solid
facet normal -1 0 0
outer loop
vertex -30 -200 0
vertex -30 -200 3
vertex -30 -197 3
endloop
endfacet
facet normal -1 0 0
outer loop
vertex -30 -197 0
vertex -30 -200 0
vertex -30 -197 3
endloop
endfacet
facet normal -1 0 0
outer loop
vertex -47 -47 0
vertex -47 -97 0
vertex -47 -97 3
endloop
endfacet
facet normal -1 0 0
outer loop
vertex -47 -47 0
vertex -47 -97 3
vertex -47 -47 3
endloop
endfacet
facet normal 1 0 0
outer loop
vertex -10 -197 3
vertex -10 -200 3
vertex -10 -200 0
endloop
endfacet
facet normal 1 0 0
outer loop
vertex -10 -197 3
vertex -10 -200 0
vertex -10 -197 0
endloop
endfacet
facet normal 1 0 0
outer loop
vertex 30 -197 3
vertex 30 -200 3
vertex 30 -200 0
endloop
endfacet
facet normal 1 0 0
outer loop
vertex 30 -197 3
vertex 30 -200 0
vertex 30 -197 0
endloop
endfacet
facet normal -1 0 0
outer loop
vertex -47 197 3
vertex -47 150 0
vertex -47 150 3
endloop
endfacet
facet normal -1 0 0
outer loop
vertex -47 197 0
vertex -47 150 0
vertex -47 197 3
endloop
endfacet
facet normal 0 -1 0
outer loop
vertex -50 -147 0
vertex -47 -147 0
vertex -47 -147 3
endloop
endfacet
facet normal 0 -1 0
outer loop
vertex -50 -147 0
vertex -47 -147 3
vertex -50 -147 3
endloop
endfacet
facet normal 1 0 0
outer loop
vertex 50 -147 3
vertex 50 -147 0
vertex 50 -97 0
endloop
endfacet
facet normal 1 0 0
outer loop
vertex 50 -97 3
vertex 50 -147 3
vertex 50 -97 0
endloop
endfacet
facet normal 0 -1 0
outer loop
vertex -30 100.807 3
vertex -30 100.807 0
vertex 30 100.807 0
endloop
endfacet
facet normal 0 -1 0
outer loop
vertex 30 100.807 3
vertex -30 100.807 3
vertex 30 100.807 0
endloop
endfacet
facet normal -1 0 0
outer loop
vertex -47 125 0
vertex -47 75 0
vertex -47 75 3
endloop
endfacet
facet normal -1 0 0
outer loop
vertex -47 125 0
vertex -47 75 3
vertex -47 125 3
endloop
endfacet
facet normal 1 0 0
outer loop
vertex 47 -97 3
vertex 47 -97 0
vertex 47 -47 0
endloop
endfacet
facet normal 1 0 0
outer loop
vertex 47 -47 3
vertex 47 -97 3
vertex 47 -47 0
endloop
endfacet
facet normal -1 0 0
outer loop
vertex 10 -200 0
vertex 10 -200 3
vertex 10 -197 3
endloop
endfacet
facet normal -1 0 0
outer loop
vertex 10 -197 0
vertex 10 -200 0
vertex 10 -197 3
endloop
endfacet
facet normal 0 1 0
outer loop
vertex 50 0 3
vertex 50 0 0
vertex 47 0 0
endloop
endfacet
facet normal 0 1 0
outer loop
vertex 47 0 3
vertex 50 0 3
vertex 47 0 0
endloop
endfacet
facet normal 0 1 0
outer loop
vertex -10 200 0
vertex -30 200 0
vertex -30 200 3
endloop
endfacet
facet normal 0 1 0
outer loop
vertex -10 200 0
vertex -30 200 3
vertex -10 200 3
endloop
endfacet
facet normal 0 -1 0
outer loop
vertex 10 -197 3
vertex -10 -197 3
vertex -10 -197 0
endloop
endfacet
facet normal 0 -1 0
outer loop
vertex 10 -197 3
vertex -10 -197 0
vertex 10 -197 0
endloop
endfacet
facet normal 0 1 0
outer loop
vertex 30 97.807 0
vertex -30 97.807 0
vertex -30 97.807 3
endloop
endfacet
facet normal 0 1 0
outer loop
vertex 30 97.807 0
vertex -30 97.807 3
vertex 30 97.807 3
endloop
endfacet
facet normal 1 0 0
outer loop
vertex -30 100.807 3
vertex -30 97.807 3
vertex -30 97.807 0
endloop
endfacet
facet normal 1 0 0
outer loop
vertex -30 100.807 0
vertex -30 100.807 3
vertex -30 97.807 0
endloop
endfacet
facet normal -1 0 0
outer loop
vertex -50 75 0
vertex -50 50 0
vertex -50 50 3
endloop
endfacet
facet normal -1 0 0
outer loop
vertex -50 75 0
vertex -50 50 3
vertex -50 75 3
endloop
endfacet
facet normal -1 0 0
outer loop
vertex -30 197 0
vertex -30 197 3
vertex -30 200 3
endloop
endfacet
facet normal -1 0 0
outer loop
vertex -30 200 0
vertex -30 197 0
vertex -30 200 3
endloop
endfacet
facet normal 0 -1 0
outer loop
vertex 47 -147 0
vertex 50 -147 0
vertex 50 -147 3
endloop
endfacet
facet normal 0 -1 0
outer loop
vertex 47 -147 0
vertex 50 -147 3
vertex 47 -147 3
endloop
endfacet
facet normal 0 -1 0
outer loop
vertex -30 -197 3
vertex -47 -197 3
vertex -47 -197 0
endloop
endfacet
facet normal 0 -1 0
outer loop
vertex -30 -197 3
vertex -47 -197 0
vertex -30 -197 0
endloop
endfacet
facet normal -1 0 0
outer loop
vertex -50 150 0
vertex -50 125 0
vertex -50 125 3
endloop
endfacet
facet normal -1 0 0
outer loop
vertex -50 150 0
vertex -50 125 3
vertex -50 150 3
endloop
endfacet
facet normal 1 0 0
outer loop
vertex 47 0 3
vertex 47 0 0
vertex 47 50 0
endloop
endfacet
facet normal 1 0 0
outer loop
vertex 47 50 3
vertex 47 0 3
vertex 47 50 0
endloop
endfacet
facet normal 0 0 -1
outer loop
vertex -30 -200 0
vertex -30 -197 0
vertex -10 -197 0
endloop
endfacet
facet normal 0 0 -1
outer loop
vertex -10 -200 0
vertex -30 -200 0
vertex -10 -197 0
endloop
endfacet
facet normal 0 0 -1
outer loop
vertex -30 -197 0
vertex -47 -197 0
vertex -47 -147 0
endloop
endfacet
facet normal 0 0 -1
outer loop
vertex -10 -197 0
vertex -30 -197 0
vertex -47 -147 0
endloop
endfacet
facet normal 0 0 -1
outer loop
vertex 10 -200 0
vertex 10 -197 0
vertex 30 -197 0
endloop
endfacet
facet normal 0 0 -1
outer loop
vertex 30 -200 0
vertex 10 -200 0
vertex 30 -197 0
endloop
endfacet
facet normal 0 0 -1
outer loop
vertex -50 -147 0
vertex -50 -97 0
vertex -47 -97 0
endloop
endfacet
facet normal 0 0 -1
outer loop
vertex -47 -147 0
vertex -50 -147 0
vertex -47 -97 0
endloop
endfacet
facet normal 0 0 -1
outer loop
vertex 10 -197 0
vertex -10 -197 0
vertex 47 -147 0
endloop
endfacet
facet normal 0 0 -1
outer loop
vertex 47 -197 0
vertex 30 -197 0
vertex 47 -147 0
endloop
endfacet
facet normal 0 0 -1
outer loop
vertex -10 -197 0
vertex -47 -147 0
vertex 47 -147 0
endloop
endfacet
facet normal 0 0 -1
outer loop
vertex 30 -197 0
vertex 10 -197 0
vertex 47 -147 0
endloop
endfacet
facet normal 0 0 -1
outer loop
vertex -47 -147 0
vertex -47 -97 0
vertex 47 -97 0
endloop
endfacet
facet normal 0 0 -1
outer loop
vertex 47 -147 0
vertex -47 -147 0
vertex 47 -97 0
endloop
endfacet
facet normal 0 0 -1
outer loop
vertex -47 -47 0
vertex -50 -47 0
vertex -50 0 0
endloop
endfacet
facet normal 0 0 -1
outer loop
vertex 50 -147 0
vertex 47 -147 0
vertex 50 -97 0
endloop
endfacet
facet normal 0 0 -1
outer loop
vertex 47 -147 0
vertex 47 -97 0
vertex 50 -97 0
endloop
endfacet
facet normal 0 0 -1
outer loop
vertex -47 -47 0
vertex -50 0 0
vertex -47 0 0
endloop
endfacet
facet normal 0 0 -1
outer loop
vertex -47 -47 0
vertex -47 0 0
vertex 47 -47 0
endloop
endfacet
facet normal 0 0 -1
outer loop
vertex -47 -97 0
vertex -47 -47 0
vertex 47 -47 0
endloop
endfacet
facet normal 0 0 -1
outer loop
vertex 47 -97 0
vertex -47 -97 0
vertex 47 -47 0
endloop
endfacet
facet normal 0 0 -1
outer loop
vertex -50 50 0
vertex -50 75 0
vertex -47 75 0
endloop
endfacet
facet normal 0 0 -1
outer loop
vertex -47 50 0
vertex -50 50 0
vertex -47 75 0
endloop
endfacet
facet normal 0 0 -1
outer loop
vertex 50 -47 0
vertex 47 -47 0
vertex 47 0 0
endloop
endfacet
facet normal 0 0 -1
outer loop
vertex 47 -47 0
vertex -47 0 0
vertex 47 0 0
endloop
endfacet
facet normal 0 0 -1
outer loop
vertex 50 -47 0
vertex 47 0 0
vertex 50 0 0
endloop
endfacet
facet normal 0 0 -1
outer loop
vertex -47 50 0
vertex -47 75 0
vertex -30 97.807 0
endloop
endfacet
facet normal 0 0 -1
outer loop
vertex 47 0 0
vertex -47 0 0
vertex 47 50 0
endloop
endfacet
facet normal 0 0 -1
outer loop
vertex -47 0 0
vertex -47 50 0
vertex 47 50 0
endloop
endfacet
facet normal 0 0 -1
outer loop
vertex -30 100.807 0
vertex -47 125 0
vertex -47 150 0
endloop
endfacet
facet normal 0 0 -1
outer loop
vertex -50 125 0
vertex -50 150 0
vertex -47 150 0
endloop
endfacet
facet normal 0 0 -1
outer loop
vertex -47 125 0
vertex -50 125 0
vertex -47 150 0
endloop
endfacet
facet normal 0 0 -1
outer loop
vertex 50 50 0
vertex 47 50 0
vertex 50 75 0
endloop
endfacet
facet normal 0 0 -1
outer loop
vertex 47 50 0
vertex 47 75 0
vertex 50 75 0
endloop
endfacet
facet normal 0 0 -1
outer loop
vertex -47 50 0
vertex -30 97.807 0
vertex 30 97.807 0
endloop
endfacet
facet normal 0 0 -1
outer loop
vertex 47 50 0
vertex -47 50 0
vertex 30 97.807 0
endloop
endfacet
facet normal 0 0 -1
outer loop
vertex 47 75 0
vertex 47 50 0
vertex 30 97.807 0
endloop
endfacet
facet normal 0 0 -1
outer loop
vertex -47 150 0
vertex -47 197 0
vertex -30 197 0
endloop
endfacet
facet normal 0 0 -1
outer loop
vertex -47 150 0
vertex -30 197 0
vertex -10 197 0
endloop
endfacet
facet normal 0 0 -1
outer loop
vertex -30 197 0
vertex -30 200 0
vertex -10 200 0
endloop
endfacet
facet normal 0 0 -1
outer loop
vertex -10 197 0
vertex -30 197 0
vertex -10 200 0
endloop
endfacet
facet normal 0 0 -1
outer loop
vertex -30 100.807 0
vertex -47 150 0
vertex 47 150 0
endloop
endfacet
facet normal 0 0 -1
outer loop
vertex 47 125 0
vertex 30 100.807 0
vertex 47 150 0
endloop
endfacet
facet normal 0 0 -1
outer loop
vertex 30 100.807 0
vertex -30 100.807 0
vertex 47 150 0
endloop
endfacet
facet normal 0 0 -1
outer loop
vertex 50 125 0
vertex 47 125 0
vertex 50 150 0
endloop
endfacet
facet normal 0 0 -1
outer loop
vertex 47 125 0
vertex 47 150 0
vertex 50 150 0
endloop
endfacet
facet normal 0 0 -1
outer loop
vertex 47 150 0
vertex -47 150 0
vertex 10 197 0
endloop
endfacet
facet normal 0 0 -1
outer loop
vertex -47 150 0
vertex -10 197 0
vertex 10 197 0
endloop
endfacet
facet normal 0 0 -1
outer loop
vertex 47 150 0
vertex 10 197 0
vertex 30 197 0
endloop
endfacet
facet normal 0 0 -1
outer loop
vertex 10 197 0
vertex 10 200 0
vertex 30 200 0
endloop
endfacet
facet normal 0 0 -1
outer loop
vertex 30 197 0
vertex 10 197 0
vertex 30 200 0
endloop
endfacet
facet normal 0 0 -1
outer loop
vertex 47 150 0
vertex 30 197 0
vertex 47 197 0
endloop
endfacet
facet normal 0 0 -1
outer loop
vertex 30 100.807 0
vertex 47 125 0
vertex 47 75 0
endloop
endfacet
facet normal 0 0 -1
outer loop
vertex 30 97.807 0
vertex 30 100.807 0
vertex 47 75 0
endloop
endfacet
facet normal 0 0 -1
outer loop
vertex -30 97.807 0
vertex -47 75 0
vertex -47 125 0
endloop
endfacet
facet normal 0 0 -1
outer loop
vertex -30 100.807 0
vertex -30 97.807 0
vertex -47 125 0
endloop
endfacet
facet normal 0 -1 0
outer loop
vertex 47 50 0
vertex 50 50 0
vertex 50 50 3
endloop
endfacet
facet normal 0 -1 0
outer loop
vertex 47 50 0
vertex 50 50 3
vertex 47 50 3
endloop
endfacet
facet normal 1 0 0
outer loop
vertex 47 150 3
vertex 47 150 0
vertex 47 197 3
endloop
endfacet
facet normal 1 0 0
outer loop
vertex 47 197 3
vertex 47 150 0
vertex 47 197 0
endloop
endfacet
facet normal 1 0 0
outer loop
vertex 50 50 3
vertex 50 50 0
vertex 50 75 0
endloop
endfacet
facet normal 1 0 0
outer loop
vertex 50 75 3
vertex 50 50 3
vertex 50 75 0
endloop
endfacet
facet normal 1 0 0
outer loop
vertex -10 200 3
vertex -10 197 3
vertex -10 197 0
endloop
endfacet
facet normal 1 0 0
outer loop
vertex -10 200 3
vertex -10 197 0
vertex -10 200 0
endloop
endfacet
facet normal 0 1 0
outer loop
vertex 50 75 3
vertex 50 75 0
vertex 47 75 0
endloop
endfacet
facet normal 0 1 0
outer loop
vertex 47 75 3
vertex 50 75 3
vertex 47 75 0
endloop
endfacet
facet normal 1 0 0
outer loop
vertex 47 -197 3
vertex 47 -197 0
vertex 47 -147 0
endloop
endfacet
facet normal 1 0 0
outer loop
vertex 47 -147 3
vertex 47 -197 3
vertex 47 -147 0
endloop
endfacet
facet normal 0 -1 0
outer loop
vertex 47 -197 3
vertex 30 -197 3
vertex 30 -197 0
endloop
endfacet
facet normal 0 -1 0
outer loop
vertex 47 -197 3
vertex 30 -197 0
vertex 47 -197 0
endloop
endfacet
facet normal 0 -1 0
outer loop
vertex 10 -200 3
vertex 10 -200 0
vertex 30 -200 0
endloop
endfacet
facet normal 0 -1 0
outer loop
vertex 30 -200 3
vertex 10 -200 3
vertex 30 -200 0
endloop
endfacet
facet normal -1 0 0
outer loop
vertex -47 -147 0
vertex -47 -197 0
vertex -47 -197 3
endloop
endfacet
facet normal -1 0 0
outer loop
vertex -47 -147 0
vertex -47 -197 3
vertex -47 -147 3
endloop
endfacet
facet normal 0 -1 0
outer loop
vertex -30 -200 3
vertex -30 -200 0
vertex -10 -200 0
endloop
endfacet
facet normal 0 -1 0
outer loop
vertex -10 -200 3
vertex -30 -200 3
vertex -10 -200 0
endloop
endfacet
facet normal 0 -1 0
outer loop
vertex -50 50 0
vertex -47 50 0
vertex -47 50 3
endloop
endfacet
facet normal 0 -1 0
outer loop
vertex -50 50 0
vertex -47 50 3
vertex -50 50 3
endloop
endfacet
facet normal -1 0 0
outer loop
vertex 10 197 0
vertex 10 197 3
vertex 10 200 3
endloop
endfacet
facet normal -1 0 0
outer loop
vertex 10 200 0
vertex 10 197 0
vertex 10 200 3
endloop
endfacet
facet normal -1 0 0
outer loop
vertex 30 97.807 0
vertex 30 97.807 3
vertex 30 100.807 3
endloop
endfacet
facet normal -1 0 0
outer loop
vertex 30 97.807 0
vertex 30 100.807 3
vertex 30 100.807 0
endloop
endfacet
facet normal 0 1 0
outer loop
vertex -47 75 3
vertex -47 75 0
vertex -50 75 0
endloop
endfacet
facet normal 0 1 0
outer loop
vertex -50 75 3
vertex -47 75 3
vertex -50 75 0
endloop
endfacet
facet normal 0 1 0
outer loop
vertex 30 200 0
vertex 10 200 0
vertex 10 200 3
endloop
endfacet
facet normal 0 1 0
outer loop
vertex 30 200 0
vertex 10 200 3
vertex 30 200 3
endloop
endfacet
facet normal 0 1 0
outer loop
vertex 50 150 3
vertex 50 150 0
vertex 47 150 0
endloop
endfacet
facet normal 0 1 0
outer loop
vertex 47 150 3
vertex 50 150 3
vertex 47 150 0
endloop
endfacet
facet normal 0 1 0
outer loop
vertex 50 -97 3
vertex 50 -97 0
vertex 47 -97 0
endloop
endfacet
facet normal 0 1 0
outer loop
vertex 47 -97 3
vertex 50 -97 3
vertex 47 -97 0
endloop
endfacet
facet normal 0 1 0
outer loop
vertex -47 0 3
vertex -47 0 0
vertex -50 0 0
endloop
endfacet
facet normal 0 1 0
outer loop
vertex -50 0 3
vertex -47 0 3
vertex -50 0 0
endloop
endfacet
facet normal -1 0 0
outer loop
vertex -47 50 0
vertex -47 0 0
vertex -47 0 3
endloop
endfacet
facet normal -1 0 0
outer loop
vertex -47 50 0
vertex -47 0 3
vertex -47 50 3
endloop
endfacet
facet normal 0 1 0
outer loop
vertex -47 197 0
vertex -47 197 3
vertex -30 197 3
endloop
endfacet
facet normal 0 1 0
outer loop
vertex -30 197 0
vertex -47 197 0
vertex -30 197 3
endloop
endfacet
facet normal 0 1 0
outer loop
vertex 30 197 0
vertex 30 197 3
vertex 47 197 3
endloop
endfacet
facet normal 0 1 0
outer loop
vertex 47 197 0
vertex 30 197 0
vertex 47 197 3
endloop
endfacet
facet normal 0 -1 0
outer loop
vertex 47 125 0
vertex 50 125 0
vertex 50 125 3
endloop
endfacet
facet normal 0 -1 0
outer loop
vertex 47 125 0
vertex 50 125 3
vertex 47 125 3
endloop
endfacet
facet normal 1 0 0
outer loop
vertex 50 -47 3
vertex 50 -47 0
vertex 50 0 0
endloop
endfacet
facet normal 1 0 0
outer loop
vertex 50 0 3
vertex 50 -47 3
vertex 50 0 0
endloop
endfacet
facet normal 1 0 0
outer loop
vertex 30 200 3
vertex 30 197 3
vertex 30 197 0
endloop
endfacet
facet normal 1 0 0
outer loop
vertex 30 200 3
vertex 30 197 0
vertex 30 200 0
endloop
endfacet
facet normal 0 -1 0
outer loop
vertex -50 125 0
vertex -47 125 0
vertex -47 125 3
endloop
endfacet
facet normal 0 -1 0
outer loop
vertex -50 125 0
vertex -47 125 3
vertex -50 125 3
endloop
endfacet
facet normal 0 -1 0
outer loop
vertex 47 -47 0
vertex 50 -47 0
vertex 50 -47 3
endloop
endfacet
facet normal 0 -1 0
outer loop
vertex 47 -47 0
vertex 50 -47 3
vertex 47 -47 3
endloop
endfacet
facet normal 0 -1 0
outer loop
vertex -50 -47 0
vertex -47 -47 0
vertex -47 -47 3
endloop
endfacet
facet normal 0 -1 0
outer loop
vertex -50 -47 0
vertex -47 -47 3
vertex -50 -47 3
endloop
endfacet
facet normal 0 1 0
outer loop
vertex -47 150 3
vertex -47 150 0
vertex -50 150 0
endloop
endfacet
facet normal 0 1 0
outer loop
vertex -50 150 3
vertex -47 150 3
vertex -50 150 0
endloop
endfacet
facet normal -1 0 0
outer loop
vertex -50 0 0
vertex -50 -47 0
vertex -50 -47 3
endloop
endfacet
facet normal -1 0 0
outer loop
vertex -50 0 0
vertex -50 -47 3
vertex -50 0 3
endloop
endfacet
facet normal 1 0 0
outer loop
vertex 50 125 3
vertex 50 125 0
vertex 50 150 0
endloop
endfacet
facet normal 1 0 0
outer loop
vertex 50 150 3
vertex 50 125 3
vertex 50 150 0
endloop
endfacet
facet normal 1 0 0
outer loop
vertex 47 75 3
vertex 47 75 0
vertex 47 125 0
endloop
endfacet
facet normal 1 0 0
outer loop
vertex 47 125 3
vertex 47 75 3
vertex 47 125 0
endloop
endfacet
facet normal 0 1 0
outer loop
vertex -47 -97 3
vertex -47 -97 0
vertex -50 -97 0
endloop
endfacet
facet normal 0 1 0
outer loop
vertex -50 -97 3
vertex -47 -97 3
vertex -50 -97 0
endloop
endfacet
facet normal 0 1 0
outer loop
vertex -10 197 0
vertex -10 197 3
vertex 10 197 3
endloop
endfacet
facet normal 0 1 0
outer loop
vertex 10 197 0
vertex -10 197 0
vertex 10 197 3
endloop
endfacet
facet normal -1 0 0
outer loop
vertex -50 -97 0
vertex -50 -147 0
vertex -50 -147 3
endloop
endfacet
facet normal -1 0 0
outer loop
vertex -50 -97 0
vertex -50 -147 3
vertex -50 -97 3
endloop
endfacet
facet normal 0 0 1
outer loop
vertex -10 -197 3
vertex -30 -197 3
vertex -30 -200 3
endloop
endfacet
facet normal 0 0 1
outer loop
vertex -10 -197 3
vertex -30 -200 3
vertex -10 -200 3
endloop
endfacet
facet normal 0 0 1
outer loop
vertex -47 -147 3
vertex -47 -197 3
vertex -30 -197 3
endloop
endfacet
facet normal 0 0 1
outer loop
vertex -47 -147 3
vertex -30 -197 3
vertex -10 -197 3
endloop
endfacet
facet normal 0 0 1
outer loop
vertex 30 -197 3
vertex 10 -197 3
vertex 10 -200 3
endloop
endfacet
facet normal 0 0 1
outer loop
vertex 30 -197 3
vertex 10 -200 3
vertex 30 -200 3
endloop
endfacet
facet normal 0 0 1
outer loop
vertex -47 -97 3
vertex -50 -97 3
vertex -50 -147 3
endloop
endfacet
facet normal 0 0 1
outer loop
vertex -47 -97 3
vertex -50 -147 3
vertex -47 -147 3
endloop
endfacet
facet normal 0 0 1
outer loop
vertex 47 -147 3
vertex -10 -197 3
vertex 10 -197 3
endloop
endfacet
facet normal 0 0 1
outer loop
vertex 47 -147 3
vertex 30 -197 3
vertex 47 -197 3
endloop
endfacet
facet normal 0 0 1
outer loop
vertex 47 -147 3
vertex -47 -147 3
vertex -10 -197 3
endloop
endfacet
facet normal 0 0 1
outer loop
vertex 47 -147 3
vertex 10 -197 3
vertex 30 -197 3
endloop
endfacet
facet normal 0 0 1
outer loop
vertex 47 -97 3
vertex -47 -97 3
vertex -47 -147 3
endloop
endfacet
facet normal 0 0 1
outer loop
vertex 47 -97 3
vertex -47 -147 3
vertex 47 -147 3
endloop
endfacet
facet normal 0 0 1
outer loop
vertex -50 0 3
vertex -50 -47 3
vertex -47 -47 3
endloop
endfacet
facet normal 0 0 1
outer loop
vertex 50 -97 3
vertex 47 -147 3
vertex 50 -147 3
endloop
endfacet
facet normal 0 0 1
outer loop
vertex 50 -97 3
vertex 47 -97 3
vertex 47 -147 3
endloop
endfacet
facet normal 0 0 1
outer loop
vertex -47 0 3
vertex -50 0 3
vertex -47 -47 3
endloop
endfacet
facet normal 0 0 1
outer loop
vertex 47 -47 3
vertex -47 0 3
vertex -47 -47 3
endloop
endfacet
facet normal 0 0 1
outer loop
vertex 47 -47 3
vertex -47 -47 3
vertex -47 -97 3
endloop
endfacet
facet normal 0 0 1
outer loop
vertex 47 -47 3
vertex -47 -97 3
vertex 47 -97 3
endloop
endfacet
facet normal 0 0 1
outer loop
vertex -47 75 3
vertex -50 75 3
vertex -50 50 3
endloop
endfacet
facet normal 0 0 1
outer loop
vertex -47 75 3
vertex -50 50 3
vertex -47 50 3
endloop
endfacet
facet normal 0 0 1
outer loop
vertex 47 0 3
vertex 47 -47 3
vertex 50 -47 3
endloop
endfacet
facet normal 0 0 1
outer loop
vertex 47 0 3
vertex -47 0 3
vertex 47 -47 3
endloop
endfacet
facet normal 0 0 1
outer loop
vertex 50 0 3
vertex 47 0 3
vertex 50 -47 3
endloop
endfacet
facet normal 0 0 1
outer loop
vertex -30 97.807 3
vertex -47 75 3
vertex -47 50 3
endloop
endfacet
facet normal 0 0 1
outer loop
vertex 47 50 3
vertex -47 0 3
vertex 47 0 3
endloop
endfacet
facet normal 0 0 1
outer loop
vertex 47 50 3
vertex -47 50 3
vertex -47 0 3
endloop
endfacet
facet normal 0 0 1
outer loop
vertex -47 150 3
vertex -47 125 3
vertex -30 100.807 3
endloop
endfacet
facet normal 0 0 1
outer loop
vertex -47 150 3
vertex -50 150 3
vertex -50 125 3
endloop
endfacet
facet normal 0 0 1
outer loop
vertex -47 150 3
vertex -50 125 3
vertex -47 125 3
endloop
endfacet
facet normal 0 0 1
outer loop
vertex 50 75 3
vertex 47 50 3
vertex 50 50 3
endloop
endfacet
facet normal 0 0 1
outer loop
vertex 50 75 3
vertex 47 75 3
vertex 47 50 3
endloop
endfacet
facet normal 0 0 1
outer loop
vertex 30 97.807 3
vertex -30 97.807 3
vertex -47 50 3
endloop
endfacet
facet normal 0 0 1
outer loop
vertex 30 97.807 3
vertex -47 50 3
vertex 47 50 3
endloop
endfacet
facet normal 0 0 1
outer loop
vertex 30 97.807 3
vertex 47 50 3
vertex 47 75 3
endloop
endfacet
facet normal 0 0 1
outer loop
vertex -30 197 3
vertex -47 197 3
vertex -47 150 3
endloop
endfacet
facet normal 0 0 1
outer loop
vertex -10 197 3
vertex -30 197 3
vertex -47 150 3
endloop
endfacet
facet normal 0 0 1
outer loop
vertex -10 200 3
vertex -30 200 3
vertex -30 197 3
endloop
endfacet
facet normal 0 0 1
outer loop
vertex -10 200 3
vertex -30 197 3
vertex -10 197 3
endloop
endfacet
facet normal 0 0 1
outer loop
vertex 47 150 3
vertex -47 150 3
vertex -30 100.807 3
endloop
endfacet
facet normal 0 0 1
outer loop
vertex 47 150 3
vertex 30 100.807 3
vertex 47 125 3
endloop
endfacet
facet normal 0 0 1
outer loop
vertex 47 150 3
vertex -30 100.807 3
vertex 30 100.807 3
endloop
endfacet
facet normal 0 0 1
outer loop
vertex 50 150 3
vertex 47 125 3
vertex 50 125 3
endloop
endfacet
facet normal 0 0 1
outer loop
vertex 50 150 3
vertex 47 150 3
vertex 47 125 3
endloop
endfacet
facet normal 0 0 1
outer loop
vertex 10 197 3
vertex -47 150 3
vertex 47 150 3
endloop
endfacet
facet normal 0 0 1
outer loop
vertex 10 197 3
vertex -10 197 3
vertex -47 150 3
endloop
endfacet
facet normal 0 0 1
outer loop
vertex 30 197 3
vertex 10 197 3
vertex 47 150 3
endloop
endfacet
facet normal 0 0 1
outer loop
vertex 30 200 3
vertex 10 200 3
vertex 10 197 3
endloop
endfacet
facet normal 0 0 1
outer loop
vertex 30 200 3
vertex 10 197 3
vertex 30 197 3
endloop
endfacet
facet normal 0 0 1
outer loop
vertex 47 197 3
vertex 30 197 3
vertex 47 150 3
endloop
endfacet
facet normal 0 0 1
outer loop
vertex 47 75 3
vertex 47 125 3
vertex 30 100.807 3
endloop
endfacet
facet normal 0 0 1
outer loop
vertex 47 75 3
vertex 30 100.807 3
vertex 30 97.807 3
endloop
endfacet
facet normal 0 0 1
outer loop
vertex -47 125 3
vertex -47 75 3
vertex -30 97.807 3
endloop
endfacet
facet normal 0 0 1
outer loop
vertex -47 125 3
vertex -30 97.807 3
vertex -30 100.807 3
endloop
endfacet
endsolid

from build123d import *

# Parameters (mm, degrees)
SKETCH1_W           = 100
SKETCH1_H           = 400
BOSS_EXTRUDE1_DEPTH = 3
SKETCH2_W           = 20
SKETCH2_H           = 3
CUT_EXTRUDE1_DEPTH  = 3
SKETCH4_W           = 3
SKETCH4_H           = 47
SKETCH4_H_2         = 50
CUT_EXTRUDE2_DEPTH  = 3
CAVITY1_START       = 97.807385879
CAVITY1_OUTLINE_W   = 60
CAVITY1_OUTLINE_H   = 3
CAVITY1_DEPTH       = 3


# Read off the part's stored shape, not the designer's step: Cavity1
with BuildPart() as part:
    # Sketch1 → Boss-Extrude1 (new body)
    with BuildSketch(Plane.XY):
        Rectangle(SKETCH1_W, SKETCH1_H)
    extrude(amount=BOSS_EXTRUDE1_DEPTH)

    # Sketch2 → Cut-Extrude1 (cut)
    with BuildSketch(Plane.XY.offset(3)):
        with Locations((-40, -198.5)):
            Rectangle(SKETCH2_W, SKETCH2_H)
        with Locations((0, -198.5)):
            Rectangle(SKETCH2_W, SKETCH2_H)
        with Locations((40, -198.5)):
            Rectangle(SKETCH2_W, SKETCH2_H)
        with Locations((40, 198.5)):
            Rectangle(SKETCH2_W, SKETCH2_H)
        with Locations((0, 198.5)):
            Rectangle(SKETCH2_W, SKETCH2_H)
        with Locations((-40, 198.5)):
            Rectangle(SKETCH2_W, SKETCH2_H)
    extrude(amount=-CUT_EXTRUDE1_DEPTH, mode=Mode.SUBTRACT)

    # Sketch4 → Cut-Extrude2 (cut)
    with BuildSketch(Plane(origin=(0, 0, 0), x_dir=(-1, 0, 0), z_dir=(0, 0, -1))):
        with Locations((-48.5, 173.5)):
            Rectangle(SKETCH4_W, SKETCH4_H)
        with Locations((-48.5, 25)):
            Rectangle(SKETCH4_W, SKETCH4_H_2)
        with Locations((-48.5, -72)):
            Rectangle(SKETCH4_W, SKETCH4_H_2)
        with Locations((-48.5, -172)):
            Rectangle(SKETCH4_W, SKETCH4_H_2)
        with Locations((48.5, -172)):
            Rectangle(SKETCH4_W, SKETCH4_H_2)
        with Locations((48.5, -72)):
            Rectangle(SKETCH4_W, SKETCH4_H_2)
        with Locations((48.5, 25)):
            Rectangle(SKETCH4_W, SKETCH4_H_2)
        with Locations((48.5, 173.5)):
            Rectangle(SKETCH4_W, SKETCH4_H)
        with Locations((48.5, 100)):
            Rectangle(SKETCH4_W, SKETCH4_H_2)
        with Locations((-48.5, 100)):
            Rectangle(SKETCH4_W, SKETCH4_H_2)
    extrude(amount=-CUT_EXTRUDE2_DEPTH, mode=Mode.SUBTRACT)

    # Cavity1 outline → Cavity1 (cut)
    with BuildSketch(Plane(origin=(0, 0, 0), x_dir=(1, 0, 0), z_dir=(0, 1, 0)).offset(CAVITY1_START)):
        with Locations((0, -1.5)):
            Rectangle(CAVITY1_OUTLINE_W, CAVITY1_OUTLINE_H)
    extrude(amount=CAVITY1_DEPTH, mode=Mode.SUBTRACT)


solid = part.part
